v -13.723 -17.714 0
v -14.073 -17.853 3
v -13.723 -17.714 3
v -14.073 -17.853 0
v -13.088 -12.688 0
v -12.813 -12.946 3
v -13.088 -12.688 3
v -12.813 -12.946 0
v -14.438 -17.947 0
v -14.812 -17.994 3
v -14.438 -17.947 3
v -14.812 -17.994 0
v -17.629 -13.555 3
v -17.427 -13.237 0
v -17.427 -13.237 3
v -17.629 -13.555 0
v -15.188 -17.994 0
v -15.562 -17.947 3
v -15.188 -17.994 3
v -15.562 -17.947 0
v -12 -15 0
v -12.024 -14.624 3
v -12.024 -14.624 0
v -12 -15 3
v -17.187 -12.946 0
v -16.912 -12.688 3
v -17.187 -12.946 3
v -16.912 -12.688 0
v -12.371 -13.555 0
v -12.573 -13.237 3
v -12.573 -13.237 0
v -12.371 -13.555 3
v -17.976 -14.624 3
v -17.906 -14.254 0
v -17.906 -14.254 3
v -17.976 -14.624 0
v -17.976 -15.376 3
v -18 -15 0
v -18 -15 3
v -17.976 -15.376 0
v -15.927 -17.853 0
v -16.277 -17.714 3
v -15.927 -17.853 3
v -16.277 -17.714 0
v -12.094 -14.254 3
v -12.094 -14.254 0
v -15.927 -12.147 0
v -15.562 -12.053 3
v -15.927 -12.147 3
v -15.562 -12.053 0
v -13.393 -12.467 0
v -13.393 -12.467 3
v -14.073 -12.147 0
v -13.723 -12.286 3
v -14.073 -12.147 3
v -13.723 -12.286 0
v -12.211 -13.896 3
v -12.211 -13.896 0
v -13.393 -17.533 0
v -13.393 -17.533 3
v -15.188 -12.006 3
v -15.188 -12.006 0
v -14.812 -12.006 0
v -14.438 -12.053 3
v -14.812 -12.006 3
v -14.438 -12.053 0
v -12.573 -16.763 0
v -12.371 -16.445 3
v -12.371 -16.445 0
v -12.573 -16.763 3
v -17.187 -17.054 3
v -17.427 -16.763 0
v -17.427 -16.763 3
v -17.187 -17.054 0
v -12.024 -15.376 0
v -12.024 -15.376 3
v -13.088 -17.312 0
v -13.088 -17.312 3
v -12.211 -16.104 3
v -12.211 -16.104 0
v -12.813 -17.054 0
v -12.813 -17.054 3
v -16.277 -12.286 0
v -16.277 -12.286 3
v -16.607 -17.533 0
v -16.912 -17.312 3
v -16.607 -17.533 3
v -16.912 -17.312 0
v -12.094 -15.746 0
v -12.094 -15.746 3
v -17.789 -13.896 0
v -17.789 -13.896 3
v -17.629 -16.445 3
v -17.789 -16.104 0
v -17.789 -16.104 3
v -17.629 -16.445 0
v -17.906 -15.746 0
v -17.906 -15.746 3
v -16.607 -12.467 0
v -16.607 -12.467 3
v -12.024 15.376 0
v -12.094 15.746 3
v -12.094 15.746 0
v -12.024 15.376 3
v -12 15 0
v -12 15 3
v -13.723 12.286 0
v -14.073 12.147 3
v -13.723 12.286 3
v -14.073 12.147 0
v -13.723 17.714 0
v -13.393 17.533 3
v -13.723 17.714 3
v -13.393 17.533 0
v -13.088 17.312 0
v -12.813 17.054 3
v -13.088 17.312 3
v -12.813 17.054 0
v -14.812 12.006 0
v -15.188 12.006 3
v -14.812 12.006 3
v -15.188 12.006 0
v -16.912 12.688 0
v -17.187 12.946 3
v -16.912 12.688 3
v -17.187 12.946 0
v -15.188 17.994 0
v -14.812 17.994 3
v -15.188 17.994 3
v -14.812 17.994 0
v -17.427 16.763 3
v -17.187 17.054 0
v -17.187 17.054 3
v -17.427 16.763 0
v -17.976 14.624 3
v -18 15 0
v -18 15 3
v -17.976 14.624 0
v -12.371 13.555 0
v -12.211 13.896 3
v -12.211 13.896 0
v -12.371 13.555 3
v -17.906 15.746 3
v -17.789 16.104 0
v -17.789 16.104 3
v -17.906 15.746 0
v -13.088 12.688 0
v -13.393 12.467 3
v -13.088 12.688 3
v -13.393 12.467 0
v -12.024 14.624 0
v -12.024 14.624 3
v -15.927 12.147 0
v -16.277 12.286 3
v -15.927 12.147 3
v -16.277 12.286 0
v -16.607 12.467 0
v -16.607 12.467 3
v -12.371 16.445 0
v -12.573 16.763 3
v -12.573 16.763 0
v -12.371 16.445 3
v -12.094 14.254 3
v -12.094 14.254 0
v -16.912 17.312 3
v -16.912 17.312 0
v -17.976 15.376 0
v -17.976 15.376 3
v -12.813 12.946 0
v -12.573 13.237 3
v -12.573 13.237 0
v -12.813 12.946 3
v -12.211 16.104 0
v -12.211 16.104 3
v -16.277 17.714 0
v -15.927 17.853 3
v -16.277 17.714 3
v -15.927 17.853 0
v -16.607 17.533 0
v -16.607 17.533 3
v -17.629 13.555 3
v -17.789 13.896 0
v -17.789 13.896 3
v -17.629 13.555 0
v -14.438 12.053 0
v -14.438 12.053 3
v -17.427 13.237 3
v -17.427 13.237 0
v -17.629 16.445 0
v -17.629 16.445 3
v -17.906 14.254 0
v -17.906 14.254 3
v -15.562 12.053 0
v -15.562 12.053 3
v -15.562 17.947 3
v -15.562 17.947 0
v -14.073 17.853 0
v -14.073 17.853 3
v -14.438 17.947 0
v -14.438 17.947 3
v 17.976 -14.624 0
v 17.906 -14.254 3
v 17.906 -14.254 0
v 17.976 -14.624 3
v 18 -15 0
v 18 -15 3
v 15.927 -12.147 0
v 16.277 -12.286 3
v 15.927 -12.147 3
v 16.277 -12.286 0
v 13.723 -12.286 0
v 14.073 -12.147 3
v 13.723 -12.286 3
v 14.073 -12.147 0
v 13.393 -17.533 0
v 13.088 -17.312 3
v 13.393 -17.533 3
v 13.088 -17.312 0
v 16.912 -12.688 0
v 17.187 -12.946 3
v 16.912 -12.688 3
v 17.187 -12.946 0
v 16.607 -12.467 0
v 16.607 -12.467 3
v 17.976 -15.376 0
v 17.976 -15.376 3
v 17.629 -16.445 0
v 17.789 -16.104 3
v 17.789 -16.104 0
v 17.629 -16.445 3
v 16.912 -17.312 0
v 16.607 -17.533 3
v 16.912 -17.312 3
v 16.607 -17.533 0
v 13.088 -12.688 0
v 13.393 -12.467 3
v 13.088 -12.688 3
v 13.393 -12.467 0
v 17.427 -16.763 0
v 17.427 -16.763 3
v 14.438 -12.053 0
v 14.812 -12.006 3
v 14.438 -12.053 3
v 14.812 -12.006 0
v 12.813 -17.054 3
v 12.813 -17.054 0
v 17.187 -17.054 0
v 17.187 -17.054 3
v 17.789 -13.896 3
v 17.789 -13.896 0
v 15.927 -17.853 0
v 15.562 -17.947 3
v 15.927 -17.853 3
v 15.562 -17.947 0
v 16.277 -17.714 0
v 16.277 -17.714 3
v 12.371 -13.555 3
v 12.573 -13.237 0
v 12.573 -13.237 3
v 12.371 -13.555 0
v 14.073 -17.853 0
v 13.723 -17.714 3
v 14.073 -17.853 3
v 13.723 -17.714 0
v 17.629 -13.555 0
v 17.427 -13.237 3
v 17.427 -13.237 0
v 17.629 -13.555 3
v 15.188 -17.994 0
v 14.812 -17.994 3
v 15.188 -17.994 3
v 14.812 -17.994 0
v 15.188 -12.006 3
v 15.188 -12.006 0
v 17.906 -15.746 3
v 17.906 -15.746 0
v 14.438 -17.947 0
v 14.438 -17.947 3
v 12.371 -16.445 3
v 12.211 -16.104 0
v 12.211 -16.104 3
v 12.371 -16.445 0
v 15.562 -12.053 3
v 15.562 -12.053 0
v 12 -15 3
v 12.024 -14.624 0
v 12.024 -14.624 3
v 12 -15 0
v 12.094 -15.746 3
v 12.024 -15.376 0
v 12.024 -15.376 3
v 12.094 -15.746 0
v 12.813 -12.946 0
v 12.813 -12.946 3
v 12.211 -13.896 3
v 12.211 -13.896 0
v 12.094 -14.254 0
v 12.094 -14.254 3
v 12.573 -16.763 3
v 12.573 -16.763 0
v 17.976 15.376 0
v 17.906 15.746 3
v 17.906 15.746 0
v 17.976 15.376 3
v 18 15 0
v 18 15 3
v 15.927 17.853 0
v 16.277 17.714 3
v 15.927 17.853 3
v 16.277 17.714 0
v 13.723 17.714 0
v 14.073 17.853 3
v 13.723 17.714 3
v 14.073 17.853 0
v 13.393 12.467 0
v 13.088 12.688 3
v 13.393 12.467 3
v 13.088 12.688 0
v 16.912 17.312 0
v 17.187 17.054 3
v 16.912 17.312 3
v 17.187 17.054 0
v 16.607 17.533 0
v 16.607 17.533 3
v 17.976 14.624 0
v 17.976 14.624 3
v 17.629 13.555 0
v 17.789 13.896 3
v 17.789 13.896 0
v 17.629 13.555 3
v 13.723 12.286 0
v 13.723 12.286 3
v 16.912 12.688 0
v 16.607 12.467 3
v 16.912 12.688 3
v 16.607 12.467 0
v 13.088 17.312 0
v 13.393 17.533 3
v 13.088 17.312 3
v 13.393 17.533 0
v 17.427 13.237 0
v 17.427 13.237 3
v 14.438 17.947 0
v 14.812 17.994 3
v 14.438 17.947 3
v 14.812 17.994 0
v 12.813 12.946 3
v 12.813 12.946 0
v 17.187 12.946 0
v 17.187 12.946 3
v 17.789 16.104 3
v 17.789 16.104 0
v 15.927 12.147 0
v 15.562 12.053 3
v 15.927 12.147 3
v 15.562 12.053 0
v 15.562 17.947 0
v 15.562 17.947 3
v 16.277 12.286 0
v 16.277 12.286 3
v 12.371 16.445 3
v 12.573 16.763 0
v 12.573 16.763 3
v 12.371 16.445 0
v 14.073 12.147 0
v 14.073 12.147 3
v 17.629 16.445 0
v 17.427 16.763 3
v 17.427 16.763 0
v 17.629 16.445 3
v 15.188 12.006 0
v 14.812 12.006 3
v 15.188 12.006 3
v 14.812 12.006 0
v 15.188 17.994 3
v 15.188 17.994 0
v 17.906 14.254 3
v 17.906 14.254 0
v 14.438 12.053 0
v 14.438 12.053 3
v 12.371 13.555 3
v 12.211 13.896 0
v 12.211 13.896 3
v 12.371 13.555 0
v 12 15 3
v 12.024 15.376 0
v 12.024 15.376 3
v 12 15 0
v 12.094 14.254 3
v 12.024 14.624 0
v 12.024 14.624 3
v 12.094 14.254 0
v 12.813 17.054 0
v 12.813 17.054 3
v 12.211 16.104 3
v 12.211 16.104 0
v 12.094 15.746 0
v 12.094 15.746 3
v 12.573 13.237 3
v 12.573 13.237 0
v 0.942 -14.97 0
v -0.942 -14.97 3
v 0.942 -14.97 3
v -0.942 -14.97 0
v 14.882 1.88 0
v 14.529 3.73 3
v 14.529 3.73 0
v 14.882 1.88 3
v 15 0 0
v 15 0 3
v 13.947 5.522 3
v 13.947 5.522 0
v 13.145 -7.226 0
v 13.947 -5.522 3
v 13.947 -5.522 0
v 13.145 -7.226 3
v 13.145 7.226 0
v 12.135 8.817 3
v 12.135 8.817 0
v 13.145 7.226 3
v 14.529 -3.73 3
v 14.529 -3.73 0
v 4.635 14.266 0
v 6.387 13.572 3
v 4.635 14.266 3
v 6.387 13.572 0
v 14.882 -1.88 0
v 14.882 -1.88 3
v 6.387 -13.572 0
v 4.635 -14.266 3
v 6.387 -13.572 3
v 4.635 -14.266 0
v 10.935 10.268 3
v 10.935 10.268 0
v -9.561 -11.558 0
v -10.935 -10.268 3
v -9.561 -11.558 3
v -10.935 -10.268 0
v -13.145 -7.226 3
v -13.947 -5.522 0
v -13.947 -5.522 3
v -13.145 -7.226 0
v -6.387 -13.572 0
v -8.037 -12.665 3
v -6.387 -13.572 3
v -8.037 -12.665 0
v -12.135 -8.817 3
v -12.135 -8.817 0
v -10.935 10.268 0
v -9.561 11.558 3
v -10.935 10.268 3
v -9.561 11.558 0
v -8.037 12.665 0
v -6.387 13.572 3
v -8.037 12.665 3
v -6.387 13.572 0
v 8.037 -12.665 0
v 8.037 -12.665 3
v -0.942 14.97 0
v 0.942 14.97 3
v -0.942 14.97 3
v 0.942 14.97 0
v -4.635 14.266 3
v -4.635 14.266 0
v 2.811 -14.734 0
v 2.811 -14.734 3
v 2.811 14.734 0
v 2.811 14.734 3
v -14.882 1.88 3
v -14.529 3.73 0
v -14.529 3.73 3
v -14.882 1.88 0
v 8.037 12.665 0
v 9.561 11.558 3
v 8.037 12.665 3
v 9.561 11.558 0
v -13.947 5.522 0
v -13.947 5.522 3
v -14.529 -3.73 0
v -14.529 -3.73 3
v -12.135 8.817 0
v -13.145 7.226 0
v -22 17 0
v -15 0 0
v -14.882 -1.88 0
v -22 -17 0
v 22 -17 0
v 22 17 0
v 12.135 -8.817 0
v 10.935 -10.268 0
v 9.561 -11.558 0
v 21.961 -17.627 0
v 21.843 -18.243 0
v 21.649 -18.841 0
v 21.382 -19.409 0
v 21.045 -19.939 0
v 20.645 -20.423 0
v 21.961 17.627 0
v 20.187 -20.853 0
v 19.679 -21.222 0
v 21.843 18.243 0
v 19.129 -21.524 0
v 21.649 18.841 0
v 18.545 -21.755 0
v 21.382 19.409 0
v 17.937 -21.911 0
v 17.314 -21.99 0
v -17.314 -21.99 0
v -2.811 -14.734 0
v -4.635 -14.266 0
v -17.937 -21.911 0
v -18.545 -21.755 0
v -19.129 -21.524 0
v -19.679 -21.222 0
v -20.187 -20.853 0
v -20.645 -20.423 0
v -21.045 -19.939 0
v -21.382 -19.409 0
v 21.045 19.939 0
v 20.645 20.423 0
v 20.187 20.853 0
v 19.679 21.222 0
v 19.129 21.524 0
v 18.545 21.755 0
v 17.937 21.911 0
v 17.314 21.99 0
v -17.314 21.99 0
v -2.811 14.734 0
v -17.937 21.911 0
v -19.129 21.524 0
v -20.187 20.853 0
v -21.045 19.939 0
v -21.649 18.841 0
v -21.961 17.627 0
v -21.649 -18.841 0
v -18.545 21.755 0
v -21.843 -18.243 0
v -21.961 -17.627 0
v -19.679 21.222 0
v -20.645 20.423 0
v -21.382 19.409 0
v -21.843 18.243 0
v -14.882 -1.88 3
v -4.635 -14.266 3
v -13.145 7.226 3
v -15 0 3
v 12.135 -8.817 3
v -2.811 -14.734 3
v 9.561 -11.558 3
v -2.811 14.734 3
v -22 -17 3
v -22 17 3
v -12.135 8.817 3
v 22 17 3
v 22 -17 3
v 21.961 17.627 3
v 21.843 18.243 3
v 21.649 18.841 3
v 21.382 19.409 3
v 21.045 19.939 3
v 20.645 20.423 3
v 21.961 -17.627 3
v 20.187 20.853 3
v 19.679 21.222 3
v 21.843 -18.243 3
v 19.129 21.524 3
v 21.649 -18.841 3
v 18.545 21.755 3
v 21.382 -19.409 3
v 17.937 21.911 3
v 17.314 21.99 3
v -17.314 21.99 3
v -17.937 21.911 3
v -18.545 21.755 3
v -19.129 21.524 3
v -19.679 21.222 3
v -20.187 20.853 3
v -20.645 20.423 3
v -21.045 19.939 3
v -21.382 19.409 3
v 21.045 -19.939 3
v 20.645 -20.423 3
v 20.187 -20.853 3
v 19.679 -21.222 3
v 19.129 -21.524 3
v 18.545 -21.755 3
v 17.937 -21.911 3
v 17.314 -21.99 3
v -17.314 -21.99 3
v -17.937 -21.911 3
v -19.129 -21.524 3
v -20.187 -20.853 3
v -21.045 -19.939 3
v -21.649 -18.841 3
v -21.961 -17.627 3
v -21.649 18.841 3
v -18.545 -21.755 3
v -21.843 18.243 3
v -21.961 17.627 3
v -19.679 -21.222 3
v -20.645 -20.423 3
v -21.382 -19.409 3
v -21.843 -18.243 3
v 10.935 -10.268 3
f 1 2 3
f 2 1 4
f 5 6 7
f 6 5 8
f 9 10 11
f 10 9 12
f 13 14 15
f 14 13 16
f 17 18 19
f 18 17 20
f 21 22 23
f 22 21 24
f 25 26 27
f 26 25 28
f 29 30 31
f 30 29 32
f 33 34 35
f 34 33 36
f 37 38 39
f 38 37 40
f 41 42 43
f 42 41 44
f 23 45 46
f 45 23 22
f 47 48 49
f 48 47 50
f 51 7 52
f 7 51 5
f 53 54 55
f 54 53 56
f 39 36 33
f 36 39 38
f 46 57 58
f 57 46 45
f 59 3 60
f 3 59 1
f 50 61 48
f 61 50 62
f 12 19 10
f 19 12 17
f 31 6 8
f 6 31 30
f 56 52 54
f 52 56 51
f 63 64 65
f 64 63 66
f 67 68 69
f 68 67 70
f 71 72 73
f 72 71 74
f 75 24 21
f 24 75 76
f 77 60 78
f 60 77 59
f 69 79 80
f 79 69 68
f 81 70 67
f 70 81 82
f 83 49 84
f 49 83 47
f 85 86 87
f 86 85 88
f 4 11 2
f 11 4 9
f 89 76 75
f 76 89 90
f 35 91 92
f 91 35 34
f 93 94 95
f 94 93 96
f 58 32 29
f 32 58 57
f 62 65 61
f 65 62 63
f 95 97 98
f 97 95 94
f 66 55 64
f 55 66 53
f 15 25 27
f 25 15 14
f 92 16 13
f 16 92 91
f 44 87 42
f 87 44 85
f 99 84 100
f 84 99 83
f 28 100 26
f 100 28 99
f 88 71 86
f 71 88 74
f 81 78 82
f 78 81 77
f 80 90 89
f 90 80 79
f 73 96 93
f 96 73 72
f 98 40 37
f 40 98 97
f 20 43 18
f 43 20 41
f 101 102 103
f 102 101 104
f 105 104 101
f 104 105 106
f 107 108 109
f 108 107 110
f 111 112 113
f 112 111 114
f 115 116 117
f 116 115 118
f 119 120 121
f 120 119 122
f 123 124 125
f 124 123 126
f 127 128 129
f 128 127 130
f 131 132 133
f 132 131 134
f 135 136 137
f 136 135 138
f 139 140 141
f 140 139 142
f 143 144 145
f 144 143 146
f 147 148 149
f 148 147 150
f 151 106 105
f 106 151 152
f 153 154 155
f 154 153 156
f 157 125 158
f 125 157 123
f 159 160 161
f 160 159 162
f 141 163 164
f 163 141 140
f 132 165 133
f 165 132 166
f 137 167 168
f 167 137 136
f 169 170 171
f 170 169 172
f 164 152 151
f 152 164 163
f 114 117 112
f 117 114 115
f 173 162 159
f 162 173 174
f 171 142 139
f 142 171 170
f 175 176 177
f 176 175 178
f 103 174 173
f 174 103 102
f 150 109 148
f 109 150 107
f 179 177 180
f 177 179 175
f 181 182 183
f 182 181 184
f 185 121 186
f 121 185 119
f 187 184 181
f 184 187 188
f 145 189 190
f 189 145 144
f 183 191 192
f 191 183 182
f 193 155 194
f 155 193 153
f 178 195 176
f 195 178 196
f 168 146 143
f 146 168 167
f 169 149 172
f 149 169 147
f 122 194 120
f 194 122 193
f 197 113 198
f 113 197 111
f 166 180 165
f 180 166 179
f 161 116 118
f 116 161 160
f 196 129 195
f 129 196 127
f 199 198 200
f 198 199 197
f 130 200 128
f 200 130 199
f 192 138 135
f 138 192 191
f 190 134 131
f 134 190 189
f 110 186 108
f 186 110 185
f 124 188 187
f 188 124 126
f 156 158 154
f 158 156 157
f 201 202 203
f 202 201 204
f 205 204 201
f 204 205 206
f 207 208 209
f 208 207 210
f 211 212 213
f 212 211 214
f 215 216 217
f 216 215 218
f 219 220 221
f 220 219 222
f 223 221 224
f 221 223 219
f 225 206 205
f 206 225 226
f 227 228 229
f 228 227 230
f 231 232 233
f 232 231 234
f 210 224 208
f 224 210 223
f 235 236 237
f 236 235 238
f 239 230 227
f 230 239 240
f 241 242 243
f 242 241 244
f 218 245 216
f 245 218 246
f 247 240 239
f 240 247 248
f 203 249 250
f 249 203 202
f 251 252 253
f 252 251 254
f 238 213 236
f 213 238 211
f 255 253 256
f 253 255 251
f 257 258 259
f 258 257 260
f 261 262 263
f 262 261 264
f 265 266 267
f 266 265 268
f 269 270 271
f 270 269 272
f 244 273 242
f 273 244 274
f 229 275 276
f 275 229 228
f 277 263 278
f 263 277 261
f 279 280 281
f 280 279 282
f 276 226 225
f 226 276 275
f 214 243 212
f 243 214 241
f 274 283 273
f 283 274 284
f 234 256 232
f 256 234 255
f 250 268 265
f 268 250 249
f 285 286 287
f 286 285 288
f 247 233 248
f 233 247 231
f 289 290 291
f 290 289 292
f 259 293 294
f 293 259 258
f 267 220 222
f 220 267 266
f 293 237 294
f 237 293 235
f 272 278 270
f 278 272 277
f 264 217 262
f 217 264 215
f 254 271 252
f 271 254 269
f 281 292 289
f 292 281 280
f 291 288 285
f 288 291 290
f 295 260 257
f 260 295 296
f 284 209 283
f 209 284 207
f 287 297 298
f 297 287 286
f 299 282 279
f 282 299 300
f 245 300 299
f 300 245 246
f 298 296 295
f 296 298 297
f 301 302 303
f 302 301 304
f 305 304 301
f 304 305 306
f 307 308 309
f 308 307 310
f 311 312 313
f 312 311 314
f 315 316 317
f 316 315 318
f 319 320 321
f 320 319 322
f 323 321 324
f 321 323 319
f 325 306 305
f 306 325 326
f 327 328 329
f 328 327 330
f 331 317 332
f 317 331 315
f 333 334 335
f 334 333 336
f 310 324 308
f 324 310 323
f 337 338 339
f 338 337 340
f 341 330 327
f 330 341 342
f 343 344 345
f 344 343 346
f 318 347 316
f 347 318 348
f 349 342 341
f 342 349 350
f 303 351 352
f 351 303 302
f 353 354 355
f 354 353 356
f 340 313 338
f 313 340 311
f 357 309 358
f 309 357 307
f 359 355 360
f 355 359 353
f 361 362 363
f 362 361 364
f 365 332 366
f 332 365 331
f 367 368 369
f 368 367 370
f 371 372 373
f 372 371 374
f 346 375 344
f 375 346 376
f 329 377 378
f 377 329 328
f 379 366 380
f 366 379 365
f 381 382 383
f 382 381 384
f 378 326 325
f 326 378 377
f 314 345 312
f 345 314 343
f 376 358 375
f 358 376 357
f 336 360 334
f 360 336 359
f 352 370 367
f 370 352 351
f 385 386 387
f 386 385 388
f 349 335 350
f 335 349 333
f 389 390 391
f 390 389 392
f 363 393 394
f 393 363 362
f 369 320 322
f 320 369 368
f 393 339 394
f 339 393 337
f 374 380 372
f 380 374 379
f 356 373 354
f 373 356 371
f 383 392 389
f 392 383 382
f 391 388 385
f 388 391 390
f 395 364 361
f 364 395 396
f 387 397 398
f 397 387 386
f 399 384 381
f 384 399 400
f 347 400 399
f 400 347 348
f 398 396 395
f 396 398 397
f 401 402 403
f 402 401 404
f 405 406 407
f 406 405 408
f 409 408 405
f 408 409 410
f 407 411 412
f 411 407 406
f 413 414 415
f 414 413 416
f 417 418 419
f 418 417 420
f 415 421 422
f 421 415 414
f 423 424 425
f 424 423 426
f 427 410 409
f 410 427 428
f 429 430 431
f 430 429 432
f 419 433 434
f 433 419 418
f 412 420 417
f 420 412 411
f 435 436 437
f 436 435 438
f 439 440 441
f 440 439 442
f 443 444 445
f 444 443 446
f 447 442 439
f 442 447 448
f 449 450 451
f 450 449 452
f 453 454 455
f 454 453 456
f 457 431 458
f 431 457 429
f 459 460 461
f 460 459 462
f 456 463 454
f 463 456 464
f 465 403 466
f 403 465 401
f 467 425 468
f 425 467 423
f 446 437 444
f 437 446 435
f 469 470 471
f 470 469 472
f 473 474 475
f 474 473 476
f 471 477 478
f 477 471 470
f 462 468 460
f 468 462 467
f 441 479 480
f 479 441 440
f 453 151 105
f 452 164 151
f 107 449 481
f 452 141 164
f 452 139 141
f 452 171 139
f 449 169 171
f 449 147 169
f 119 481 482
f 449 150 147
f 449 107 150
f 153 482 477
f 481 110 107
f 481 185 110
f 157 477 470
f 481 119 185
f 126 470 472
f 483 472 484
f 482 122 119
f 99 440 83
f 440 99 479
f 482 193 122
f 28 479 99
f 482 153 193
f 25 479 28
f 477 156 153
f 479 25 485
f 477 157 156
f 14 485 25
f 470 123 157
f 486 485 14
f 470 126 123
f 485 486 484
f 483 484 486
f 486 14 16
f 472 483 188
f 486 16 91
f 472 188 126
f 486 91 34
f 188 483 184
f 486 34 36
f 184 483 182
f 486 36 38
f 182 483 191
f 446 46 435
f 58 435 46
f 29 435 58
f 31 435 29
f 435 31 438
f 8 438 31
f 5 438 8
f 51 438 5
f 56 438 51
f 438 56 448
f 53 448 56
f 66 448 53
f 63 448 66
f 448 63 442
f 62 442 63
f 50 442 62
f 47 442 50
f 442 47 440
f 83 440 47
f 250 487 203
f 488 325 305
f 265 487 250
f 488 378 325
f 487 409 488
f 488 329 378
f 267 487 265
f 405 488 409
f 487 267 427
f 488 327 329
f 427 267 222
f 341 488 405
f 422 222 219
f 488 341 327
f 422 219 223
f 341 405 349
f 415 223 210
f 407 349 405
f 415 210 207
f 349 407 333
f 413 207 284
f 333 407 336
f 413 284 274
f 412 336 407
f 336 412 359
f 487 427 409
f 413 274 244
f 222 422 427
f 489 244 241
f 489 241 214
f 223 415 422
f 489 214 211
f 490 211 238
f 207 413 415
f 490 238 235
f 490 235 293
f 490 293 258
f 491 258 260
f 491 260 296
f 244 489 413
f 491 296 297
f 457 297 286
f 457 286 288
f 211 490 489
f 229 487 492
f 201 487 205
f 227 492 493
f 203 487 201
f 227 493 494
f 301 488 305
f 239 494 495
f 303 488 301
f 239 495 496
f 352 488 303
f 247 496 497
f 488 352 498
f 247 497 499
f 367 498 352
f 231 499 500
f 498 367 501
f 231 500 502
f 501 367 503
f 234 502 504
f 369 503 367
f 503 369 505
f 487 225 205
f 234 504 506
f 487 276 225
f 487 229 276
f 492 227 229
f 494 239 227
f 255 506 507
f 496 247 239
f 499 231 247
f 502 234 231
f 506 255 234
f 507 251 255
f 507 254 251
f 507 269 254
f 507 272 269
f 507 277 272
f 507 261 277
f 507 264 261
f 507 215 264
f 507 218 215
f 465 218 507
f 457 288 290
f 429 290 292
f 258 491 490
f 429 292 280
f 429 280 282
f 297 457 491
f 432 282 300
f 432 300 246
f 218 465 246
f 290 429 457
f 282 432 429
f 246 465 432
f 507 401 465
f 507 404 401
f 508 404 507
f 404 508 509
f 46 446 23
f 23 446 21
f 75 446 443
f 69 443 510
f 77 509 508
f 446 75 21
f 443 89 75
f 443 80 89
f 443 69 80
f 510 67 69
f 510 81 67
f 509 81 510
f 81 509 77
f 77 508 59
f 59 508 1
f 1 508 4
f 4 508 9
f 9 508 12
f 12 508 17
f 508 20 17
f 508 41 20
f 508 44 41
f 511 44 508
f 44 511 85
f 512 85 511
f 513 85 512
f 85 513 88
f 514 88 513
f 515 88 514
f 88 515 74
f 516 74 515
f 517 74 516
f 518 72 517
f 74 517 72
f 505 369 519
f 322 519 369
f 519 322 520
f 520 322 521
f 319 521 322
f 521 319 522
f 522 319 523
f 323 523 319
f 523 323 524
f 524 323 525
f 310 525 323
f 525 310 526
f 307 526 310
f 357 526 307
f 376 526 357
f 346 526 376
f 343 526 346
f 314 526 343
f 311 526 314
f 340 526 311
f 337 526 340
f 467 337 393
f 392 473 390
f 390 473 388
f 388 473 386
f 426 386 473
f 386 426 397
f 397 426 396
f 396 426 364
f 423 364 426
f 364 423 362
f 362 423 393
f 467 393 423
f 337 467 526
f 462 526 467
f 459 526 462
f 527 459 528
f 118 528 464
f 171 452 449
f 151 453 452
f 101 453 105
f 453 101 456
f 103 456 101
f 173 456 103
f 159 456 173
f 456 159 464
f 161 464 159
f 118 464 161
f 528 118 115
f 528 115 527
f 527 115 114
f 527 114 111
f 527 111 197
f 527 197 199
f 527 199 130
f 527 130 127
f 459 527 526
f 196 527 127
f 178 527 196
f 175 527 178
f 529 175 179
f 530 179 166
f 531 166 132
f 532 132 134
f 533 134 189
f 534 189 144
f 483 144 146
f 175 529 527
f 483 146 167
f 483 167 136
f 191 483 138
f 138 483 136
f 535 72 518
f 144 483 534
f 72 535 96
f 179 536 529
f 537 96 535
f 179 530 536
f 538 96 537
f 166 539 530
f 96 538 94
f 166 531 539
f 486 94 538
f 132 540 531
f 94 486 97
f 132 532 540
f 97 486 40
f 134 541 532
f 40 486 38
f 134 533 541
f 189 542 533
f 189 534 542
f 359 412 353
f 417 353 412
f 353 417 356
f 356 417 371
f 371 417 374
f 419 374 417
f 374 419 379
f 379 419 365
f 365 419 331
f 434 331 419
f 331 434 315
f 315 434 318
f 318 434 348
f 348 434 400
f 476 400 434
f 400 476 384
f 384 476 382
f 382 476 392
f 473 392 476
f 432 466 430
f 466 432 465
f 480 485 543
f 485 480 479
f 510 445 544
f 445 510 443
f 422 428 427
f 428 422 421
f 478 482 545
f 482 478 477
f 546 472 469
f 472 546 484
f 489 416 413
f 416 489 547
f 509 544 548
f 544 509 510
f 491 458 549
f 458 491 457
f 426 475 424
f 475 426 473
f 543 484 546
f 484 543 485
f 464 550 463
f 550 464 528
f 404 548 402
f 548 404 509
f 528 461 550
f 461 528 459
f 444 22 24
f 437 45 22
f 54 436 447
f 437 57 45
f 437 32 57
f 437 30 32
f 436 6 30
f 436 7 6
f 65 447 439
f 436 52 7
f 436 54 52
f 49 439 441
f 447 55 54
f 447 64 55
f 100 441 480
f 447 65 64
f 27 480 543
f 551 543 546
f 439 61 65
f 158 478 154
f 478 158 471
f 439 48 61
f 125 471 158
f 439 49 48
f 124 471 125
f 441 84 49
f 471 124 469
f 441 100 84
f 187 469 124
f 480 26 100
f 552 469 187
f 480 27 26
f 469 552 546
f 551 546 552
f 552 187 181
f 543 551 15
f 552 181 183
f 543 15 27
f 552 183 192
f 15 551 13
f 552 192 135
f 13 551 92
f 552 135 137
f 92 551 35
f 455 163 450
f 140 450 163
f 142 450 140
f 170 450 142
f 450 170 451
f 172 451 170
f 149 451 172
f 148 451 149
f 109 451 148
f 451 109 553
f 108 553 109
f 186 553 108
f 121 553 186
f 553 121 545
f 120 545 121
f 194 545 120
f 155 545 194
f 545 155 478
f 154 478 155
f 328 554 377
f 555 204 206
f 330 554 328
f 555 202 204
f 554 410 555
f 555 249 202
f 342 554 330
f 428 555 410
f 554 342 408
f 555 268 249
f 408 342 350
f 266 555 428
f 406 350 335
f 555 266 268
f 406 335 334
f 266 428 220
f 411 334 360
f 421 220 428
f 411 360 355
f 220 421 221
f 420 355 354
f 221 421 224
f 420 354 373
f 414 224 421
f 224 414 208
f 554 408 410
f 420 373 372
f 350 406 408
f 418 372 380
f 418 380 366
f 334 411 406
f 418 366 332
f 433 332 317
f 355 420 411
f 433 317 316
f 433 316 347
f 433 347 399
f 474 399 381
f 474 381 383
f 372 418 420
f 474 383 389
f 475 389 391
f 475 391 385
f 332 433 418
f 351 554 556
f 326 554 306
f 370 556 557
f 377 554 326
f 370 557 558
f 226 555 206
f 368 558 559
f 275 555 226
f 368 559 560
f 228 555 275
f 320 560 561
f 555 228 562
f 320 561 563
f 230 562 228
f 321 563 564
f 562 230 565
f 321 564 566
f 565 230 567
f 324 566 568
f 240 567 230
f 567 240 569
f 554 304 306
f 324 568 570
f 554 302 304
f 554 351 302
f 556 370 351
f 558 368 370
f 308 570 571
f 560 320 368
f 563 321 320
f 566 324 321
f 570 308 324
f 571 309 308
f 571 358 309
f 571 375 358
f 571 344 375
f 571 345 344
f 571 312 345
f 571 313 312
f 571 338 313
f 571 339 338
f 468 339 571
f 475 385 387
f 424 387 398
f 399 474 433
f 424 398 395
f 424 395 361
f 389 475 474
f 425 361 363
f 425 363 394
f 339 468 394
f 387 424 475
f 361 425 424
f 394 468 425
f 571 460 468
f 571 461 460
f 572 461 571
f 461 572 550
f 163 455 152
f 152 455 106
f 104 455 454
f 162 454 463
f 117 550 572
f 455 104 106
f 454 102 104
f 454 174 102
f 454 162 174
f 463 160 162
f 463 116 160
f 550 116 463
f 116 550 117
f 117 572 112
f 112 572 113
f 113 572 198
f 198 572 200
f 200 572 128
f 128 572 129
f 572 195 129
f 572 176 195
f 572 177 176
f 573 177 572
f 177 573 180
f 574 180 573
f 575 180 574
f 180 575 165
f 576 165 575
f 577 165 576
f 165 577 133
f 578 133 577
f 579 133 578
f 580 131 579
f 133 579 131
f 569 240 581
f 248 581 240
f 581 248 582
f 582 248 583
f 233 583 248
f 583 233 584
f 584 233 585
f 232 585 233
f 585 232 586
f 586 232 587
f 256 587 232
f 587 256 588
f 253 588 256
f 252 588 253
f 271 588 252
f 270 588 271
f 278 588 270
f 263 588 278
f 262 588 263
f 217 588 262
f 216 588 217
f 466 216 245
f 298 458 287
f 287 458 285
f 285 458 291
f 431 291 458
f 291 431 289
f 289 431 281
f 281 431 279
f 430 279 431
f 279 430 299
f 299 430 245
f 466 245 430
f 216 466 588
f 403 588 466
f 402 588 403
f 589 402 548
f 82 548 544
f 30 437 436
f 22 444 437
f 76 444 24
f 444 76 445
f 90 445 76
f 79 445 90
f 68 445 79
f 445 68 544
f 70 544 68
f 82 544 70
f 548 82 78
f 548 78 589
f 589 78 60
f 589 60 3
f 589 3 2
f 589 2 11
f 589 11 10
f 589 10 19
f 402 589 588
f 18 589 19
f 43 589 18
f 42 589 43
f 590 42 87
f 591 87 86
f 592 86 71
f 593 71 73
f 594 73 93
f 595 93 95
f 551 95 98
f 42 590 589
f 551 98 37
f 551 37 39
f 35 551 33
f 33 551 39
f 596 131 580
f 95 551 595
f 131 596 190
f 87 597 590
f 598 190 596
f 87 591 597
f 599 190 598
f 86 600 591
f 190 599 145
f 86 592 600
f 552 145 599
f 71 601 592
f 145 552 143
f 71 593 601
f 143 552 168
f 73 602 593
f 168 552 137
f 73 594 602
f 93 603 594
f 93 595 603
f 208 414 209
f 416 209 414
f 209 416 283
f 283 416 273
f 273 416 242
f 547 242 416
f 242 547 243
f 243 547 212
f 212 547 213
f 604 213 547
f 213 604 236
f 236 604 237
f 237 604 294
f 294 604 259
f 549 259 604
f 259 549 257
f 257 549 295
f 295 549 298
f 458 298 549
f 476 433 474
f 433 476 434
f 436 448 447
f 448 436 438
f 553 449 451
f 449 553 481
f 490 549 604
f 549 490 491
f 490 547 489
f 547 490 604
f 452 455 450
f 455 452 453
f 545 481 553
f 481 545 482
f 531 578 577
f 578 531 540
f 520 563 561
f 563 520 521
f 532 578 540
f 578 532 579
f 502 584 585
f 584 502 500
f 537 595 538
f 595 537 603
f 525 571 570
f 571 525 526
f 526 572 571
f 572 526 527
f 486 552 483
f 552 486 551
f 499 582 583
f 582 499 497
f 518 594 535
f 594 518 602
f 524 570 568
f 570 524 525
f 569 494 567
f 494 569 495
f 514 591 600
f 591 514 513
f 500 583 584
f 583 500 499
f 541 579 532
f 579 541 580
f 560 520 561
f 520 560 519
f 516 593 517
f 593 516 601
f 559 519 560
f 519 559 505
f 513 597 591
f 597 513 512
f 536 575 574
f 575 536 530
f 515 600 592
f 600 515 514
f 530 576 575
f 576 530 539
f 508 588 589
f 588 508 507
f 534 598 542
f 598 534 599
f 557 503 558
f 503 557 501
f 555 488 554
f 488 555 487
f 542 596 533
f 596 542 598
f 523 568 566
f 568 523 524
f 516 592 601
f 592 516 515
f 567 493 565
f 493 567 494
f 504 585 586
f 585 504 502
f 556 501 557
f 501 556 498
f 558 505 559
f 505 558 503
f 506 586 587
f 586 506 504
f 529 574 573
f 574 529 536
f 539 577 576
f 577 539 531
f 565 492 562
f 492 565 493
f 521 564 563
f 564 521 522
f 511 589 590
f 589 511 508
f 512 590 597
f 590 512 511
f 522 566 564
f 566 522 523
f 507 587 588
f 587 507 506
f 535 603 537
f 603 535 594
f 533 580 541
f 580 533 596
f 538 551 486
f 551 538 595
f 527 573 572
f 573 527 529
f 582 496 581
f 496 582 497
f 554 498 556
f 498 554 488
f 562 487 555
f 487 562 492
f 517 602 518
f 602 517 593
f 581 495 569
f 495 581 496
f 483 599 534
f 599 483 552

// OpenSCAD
$fn = 50;


difference() {
	union() {
		hull() {
			translate(v = [-17.0000000000, 17.0000000000, 0]) {
				cylinder(h = 3, r = 5);
			}
			translate(v = [17.0000000000, 17.0000000000, 0]) {
				cylinder(h = 3, r = 5);
			}
			translate(v = [-17.0000000000, -17.0000000000, 0]) {
				cylinder(h = 3, r = 5);
			}
			translate(v = [17.0000000000, -17.0000000000, 0]) {
				cylinder(h = 3, r = 5);
			}
		}
	}
	union() {
		#translate(v = [-15.0000000000, -15.0000000000, -100.0000000000]) {
			cylinder(h = 200, r = 3.0000000000);
		}
		#translate(v = [-15.0000000000, 15.0000000000, -100.0000000000]) {
			cylinder(h = 200, r = 3.0000000000);
		}
		#translate(v = [15.0000000000, -15.0000000000, -100.0000000000]) {
			cylinder(h = 200, r = 3.0000000000);
		}
		#translate(v = [15.0000000000, 15.0000000000, -100.0000000000]) {
			cylinder(h = 200, r = 3.0000000000);
		}
		#cylinder(h = 3, r = 15.0000000000);
	}
}
